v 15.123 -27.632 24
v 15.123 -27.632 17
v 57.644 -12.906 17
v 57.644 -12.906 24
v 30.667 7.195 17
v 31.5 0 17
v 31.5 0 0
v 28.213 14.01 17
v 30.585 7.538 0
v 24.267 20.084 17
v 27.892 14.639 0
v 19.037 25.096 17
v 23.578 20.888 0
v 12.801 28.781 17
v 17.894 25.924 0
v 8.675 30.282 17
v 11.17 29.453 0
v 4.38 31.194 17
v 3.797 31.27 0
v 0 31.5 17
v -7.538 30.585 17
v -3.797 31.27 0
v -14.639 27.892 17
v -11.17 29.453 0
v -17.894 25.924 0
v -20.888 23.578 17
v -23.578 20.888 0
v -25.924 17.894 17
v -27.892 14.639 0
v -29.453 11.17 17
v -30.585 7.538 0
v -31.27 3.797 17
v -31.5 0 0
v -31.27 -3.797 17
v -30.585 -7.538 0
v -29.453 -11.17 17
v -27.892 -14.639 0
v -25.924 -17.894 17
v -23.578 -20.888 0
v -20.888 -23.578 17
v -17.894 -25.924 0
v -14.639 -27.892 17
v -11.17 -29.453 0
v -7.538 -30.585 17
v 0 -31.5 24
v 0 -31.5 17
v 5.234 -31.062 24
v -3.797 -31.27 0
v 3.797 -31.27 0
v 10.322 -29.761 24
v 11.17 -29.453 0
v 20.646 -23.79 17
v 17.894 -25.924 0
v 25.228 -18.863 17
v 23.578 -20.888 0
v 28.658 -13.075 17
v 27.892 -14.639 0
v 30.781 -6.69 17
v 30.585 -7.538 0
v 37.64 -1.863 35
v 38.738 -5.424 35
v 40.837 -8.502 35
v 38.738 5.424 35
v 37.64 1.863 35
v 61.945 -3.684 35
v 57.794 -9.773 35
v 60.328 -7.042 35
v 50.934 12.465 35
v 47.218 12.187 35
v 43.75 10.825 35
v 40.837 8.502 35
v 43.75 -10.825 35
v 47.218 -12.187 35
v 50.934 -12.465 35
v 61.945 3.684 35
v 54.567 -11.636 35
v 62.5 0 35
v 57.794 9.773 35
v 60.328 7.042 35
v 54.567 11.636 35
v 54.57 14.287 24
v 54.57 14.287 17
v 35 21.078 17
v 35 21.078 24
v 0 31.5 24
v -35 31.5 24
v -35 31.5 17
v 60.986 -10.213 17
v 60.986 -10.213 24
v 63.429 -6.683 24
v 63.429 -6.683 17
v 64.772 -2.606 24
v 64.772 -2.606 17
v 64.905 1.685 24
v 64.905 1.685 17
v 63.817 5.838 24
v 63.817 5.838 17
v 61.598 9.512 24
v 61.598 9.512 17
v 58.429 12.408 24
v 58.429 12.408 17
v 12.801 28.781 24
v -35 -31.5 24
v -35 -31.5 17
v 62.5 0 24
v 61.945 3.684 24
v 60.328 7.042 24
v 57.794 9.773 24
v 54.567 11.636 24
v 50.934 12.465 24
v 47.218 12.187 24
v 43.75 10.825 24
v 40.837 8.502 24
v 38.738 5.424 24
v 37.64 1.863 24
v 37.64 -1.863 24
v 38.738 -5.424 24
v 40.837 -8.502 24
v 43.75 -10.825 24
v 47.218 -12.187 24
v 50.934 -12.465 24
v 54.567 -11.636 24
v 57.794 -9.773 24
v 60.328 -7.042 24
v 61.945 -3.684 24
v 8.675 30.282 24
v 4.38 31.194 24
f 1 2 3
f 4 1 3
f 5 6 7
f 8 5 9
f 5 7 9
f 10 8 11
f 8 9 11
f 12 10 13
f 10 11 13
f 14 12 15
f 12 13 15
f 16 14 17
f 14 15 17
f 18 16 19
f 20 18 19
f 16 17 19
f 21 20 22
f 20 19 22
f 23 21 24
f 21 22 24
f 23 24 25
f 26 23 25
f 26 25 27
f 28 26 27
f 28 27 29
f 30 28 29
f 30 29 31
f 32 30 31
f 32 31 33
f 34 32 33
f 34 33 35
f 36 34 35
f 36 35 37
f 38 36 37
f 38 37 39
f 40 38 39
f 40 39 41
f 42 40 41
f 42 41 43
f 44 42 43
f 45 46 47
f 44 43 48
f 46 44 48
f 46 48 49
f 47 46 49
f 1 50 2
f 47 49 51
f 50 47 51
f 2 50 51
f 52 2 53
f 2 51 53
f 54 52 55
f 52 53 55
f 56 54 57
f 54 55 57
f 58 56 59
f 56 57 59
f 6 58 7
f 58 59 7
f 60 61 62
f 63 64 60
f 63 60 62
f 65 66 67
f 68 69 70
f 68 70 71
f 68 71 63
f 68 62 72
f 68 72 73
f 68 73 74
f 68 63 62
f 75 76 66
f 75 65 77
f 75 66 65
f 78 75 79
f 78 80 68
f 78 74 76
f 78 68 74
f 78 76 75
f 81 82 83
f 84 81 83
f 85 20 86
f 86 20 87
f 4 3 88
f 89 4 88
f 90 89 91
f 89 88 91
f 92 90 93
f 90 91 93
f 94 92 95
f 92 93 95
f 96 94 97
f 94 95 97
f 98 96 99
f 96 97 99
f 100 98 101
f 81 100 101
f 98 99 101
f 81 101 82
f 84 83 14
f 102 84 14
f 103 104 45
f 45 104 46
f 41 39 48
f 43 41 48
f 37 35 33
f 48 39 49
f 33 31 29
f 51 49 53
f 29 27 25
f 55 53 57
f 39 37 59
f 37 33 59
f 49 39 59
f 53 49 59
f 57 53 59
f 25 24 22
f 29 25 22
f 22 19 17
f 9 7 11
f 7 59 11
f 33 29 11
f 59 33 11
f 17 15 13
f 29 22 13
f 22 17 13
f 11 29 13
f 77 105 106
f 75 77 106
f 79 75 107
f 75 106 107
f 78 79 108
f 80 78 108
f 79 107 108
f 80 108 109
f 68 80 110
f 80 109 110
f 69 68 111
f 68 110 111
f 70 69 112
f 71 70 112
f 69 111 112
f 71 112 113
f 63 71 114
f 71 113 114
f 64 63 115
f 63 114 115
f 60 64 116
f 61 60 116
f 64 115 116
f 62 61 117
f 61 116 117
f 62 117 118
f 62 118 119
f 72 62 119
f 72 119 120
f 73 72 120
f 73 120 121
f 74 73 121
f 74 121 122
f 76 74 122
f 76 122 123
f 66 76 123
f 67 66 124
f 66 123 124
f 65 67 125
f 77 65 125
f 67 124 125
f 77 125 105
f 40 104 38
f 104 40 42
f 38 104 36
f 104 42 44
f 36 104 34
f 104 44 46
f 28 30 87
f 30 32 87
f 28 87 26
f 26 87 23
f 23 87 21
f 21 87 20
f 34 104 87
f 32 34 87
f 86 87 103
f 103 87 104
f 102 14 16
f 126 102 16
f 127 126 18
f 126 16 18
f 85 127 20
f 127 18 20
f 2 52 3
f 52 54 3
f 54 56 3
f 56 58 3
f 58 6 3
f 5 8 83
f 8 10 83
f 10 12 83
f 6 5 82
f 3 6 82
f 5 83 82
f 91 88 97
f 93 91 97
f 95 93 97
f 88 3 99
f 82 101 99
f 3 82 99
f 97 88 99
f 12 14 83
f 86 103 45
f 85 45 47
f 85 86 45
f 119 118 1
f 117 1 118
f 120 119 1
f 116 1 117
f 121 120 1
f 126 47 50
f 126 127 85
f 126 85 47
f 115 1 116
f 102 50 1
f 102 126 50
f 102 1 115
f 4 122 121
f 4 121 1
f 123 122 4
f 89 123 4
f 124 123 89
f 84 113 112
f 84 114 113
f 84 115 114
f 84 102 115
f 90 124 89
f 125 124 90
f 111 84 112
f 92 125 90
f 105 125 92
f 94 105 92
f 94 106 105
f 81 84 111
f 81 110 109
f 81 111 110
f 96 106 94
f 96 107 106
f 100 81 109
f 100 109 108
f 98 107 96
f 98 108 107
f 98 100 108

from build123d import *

# Parameters (mm, degrees)
SKETCH1_R           = 31.5
BOSS_EXTRUDE1_DEPTH = 17
SKETCH2_R           = 31.5
BOSS_EXTRUDE2_DEPTH = 7
SKETCH3_R           = 12.5
BOSS_EXTRUDE3_DEPTH = 11


with BuildPart() as part:
    # Sketch1 → Boss-Extrude1 (new body)
    with BuildSketch(Plane.XY):
        Circle(SKETCH1_R)
    extrude(amount=BOSS_EXTRUDE1_DEPTH)

    # Sketch2 → Boss-Extrude2 (add)
    with BuildSketch(Plane.XY.offset(17)):
        with BuildLine():
            Line((0, 31.5), (-35, 31.5))
            Line((-35, 31.5), (-35, -31.5))
            Line((-35, -31.5), (0, -31.5))
            ThreePointArc((0, -31.5), (-31.5, 0), (0, 31.5))
        make_face()
        with Locations(Location((0, 0, 0), (0, 0, 90))):
            Circle(SKETCH2_R)
        with BuildLine():
            Line((35, 21.078091868), (12.801393416, 28.78149278))
            ThreePointArc((12.801393416, 28.78149278), (26.414900081, 17.161091274), (31.5, 0))
            ThreePointArc((31.5, 0), (27.098152806, -16.060514142), (15.122849874, -27.632397864))
            Line((15.122849874, -27.632397864), (57.643936691, -12.906209043))
            ThreePointArc((57.643936691, -12.906209043), (64.905048238, 1.685092584), (54.569602713, 14.28701267))
            Line((54.569602713, 14.28701267), (35, 21.078091868))
        make_face()
    extrude(amount=BOSS_EXTRUDE2_DEPTH)

    # Sketch3 → Boss-Extrude3 (add)
    with BuildSketch(Plane.XY.offset(24)):
        with Locations((50, 0)):
            Circle(SKETCH3_R)
    extrude(amount=BOSS_EXTRUDE3_DEPTH)


solid = part.part
